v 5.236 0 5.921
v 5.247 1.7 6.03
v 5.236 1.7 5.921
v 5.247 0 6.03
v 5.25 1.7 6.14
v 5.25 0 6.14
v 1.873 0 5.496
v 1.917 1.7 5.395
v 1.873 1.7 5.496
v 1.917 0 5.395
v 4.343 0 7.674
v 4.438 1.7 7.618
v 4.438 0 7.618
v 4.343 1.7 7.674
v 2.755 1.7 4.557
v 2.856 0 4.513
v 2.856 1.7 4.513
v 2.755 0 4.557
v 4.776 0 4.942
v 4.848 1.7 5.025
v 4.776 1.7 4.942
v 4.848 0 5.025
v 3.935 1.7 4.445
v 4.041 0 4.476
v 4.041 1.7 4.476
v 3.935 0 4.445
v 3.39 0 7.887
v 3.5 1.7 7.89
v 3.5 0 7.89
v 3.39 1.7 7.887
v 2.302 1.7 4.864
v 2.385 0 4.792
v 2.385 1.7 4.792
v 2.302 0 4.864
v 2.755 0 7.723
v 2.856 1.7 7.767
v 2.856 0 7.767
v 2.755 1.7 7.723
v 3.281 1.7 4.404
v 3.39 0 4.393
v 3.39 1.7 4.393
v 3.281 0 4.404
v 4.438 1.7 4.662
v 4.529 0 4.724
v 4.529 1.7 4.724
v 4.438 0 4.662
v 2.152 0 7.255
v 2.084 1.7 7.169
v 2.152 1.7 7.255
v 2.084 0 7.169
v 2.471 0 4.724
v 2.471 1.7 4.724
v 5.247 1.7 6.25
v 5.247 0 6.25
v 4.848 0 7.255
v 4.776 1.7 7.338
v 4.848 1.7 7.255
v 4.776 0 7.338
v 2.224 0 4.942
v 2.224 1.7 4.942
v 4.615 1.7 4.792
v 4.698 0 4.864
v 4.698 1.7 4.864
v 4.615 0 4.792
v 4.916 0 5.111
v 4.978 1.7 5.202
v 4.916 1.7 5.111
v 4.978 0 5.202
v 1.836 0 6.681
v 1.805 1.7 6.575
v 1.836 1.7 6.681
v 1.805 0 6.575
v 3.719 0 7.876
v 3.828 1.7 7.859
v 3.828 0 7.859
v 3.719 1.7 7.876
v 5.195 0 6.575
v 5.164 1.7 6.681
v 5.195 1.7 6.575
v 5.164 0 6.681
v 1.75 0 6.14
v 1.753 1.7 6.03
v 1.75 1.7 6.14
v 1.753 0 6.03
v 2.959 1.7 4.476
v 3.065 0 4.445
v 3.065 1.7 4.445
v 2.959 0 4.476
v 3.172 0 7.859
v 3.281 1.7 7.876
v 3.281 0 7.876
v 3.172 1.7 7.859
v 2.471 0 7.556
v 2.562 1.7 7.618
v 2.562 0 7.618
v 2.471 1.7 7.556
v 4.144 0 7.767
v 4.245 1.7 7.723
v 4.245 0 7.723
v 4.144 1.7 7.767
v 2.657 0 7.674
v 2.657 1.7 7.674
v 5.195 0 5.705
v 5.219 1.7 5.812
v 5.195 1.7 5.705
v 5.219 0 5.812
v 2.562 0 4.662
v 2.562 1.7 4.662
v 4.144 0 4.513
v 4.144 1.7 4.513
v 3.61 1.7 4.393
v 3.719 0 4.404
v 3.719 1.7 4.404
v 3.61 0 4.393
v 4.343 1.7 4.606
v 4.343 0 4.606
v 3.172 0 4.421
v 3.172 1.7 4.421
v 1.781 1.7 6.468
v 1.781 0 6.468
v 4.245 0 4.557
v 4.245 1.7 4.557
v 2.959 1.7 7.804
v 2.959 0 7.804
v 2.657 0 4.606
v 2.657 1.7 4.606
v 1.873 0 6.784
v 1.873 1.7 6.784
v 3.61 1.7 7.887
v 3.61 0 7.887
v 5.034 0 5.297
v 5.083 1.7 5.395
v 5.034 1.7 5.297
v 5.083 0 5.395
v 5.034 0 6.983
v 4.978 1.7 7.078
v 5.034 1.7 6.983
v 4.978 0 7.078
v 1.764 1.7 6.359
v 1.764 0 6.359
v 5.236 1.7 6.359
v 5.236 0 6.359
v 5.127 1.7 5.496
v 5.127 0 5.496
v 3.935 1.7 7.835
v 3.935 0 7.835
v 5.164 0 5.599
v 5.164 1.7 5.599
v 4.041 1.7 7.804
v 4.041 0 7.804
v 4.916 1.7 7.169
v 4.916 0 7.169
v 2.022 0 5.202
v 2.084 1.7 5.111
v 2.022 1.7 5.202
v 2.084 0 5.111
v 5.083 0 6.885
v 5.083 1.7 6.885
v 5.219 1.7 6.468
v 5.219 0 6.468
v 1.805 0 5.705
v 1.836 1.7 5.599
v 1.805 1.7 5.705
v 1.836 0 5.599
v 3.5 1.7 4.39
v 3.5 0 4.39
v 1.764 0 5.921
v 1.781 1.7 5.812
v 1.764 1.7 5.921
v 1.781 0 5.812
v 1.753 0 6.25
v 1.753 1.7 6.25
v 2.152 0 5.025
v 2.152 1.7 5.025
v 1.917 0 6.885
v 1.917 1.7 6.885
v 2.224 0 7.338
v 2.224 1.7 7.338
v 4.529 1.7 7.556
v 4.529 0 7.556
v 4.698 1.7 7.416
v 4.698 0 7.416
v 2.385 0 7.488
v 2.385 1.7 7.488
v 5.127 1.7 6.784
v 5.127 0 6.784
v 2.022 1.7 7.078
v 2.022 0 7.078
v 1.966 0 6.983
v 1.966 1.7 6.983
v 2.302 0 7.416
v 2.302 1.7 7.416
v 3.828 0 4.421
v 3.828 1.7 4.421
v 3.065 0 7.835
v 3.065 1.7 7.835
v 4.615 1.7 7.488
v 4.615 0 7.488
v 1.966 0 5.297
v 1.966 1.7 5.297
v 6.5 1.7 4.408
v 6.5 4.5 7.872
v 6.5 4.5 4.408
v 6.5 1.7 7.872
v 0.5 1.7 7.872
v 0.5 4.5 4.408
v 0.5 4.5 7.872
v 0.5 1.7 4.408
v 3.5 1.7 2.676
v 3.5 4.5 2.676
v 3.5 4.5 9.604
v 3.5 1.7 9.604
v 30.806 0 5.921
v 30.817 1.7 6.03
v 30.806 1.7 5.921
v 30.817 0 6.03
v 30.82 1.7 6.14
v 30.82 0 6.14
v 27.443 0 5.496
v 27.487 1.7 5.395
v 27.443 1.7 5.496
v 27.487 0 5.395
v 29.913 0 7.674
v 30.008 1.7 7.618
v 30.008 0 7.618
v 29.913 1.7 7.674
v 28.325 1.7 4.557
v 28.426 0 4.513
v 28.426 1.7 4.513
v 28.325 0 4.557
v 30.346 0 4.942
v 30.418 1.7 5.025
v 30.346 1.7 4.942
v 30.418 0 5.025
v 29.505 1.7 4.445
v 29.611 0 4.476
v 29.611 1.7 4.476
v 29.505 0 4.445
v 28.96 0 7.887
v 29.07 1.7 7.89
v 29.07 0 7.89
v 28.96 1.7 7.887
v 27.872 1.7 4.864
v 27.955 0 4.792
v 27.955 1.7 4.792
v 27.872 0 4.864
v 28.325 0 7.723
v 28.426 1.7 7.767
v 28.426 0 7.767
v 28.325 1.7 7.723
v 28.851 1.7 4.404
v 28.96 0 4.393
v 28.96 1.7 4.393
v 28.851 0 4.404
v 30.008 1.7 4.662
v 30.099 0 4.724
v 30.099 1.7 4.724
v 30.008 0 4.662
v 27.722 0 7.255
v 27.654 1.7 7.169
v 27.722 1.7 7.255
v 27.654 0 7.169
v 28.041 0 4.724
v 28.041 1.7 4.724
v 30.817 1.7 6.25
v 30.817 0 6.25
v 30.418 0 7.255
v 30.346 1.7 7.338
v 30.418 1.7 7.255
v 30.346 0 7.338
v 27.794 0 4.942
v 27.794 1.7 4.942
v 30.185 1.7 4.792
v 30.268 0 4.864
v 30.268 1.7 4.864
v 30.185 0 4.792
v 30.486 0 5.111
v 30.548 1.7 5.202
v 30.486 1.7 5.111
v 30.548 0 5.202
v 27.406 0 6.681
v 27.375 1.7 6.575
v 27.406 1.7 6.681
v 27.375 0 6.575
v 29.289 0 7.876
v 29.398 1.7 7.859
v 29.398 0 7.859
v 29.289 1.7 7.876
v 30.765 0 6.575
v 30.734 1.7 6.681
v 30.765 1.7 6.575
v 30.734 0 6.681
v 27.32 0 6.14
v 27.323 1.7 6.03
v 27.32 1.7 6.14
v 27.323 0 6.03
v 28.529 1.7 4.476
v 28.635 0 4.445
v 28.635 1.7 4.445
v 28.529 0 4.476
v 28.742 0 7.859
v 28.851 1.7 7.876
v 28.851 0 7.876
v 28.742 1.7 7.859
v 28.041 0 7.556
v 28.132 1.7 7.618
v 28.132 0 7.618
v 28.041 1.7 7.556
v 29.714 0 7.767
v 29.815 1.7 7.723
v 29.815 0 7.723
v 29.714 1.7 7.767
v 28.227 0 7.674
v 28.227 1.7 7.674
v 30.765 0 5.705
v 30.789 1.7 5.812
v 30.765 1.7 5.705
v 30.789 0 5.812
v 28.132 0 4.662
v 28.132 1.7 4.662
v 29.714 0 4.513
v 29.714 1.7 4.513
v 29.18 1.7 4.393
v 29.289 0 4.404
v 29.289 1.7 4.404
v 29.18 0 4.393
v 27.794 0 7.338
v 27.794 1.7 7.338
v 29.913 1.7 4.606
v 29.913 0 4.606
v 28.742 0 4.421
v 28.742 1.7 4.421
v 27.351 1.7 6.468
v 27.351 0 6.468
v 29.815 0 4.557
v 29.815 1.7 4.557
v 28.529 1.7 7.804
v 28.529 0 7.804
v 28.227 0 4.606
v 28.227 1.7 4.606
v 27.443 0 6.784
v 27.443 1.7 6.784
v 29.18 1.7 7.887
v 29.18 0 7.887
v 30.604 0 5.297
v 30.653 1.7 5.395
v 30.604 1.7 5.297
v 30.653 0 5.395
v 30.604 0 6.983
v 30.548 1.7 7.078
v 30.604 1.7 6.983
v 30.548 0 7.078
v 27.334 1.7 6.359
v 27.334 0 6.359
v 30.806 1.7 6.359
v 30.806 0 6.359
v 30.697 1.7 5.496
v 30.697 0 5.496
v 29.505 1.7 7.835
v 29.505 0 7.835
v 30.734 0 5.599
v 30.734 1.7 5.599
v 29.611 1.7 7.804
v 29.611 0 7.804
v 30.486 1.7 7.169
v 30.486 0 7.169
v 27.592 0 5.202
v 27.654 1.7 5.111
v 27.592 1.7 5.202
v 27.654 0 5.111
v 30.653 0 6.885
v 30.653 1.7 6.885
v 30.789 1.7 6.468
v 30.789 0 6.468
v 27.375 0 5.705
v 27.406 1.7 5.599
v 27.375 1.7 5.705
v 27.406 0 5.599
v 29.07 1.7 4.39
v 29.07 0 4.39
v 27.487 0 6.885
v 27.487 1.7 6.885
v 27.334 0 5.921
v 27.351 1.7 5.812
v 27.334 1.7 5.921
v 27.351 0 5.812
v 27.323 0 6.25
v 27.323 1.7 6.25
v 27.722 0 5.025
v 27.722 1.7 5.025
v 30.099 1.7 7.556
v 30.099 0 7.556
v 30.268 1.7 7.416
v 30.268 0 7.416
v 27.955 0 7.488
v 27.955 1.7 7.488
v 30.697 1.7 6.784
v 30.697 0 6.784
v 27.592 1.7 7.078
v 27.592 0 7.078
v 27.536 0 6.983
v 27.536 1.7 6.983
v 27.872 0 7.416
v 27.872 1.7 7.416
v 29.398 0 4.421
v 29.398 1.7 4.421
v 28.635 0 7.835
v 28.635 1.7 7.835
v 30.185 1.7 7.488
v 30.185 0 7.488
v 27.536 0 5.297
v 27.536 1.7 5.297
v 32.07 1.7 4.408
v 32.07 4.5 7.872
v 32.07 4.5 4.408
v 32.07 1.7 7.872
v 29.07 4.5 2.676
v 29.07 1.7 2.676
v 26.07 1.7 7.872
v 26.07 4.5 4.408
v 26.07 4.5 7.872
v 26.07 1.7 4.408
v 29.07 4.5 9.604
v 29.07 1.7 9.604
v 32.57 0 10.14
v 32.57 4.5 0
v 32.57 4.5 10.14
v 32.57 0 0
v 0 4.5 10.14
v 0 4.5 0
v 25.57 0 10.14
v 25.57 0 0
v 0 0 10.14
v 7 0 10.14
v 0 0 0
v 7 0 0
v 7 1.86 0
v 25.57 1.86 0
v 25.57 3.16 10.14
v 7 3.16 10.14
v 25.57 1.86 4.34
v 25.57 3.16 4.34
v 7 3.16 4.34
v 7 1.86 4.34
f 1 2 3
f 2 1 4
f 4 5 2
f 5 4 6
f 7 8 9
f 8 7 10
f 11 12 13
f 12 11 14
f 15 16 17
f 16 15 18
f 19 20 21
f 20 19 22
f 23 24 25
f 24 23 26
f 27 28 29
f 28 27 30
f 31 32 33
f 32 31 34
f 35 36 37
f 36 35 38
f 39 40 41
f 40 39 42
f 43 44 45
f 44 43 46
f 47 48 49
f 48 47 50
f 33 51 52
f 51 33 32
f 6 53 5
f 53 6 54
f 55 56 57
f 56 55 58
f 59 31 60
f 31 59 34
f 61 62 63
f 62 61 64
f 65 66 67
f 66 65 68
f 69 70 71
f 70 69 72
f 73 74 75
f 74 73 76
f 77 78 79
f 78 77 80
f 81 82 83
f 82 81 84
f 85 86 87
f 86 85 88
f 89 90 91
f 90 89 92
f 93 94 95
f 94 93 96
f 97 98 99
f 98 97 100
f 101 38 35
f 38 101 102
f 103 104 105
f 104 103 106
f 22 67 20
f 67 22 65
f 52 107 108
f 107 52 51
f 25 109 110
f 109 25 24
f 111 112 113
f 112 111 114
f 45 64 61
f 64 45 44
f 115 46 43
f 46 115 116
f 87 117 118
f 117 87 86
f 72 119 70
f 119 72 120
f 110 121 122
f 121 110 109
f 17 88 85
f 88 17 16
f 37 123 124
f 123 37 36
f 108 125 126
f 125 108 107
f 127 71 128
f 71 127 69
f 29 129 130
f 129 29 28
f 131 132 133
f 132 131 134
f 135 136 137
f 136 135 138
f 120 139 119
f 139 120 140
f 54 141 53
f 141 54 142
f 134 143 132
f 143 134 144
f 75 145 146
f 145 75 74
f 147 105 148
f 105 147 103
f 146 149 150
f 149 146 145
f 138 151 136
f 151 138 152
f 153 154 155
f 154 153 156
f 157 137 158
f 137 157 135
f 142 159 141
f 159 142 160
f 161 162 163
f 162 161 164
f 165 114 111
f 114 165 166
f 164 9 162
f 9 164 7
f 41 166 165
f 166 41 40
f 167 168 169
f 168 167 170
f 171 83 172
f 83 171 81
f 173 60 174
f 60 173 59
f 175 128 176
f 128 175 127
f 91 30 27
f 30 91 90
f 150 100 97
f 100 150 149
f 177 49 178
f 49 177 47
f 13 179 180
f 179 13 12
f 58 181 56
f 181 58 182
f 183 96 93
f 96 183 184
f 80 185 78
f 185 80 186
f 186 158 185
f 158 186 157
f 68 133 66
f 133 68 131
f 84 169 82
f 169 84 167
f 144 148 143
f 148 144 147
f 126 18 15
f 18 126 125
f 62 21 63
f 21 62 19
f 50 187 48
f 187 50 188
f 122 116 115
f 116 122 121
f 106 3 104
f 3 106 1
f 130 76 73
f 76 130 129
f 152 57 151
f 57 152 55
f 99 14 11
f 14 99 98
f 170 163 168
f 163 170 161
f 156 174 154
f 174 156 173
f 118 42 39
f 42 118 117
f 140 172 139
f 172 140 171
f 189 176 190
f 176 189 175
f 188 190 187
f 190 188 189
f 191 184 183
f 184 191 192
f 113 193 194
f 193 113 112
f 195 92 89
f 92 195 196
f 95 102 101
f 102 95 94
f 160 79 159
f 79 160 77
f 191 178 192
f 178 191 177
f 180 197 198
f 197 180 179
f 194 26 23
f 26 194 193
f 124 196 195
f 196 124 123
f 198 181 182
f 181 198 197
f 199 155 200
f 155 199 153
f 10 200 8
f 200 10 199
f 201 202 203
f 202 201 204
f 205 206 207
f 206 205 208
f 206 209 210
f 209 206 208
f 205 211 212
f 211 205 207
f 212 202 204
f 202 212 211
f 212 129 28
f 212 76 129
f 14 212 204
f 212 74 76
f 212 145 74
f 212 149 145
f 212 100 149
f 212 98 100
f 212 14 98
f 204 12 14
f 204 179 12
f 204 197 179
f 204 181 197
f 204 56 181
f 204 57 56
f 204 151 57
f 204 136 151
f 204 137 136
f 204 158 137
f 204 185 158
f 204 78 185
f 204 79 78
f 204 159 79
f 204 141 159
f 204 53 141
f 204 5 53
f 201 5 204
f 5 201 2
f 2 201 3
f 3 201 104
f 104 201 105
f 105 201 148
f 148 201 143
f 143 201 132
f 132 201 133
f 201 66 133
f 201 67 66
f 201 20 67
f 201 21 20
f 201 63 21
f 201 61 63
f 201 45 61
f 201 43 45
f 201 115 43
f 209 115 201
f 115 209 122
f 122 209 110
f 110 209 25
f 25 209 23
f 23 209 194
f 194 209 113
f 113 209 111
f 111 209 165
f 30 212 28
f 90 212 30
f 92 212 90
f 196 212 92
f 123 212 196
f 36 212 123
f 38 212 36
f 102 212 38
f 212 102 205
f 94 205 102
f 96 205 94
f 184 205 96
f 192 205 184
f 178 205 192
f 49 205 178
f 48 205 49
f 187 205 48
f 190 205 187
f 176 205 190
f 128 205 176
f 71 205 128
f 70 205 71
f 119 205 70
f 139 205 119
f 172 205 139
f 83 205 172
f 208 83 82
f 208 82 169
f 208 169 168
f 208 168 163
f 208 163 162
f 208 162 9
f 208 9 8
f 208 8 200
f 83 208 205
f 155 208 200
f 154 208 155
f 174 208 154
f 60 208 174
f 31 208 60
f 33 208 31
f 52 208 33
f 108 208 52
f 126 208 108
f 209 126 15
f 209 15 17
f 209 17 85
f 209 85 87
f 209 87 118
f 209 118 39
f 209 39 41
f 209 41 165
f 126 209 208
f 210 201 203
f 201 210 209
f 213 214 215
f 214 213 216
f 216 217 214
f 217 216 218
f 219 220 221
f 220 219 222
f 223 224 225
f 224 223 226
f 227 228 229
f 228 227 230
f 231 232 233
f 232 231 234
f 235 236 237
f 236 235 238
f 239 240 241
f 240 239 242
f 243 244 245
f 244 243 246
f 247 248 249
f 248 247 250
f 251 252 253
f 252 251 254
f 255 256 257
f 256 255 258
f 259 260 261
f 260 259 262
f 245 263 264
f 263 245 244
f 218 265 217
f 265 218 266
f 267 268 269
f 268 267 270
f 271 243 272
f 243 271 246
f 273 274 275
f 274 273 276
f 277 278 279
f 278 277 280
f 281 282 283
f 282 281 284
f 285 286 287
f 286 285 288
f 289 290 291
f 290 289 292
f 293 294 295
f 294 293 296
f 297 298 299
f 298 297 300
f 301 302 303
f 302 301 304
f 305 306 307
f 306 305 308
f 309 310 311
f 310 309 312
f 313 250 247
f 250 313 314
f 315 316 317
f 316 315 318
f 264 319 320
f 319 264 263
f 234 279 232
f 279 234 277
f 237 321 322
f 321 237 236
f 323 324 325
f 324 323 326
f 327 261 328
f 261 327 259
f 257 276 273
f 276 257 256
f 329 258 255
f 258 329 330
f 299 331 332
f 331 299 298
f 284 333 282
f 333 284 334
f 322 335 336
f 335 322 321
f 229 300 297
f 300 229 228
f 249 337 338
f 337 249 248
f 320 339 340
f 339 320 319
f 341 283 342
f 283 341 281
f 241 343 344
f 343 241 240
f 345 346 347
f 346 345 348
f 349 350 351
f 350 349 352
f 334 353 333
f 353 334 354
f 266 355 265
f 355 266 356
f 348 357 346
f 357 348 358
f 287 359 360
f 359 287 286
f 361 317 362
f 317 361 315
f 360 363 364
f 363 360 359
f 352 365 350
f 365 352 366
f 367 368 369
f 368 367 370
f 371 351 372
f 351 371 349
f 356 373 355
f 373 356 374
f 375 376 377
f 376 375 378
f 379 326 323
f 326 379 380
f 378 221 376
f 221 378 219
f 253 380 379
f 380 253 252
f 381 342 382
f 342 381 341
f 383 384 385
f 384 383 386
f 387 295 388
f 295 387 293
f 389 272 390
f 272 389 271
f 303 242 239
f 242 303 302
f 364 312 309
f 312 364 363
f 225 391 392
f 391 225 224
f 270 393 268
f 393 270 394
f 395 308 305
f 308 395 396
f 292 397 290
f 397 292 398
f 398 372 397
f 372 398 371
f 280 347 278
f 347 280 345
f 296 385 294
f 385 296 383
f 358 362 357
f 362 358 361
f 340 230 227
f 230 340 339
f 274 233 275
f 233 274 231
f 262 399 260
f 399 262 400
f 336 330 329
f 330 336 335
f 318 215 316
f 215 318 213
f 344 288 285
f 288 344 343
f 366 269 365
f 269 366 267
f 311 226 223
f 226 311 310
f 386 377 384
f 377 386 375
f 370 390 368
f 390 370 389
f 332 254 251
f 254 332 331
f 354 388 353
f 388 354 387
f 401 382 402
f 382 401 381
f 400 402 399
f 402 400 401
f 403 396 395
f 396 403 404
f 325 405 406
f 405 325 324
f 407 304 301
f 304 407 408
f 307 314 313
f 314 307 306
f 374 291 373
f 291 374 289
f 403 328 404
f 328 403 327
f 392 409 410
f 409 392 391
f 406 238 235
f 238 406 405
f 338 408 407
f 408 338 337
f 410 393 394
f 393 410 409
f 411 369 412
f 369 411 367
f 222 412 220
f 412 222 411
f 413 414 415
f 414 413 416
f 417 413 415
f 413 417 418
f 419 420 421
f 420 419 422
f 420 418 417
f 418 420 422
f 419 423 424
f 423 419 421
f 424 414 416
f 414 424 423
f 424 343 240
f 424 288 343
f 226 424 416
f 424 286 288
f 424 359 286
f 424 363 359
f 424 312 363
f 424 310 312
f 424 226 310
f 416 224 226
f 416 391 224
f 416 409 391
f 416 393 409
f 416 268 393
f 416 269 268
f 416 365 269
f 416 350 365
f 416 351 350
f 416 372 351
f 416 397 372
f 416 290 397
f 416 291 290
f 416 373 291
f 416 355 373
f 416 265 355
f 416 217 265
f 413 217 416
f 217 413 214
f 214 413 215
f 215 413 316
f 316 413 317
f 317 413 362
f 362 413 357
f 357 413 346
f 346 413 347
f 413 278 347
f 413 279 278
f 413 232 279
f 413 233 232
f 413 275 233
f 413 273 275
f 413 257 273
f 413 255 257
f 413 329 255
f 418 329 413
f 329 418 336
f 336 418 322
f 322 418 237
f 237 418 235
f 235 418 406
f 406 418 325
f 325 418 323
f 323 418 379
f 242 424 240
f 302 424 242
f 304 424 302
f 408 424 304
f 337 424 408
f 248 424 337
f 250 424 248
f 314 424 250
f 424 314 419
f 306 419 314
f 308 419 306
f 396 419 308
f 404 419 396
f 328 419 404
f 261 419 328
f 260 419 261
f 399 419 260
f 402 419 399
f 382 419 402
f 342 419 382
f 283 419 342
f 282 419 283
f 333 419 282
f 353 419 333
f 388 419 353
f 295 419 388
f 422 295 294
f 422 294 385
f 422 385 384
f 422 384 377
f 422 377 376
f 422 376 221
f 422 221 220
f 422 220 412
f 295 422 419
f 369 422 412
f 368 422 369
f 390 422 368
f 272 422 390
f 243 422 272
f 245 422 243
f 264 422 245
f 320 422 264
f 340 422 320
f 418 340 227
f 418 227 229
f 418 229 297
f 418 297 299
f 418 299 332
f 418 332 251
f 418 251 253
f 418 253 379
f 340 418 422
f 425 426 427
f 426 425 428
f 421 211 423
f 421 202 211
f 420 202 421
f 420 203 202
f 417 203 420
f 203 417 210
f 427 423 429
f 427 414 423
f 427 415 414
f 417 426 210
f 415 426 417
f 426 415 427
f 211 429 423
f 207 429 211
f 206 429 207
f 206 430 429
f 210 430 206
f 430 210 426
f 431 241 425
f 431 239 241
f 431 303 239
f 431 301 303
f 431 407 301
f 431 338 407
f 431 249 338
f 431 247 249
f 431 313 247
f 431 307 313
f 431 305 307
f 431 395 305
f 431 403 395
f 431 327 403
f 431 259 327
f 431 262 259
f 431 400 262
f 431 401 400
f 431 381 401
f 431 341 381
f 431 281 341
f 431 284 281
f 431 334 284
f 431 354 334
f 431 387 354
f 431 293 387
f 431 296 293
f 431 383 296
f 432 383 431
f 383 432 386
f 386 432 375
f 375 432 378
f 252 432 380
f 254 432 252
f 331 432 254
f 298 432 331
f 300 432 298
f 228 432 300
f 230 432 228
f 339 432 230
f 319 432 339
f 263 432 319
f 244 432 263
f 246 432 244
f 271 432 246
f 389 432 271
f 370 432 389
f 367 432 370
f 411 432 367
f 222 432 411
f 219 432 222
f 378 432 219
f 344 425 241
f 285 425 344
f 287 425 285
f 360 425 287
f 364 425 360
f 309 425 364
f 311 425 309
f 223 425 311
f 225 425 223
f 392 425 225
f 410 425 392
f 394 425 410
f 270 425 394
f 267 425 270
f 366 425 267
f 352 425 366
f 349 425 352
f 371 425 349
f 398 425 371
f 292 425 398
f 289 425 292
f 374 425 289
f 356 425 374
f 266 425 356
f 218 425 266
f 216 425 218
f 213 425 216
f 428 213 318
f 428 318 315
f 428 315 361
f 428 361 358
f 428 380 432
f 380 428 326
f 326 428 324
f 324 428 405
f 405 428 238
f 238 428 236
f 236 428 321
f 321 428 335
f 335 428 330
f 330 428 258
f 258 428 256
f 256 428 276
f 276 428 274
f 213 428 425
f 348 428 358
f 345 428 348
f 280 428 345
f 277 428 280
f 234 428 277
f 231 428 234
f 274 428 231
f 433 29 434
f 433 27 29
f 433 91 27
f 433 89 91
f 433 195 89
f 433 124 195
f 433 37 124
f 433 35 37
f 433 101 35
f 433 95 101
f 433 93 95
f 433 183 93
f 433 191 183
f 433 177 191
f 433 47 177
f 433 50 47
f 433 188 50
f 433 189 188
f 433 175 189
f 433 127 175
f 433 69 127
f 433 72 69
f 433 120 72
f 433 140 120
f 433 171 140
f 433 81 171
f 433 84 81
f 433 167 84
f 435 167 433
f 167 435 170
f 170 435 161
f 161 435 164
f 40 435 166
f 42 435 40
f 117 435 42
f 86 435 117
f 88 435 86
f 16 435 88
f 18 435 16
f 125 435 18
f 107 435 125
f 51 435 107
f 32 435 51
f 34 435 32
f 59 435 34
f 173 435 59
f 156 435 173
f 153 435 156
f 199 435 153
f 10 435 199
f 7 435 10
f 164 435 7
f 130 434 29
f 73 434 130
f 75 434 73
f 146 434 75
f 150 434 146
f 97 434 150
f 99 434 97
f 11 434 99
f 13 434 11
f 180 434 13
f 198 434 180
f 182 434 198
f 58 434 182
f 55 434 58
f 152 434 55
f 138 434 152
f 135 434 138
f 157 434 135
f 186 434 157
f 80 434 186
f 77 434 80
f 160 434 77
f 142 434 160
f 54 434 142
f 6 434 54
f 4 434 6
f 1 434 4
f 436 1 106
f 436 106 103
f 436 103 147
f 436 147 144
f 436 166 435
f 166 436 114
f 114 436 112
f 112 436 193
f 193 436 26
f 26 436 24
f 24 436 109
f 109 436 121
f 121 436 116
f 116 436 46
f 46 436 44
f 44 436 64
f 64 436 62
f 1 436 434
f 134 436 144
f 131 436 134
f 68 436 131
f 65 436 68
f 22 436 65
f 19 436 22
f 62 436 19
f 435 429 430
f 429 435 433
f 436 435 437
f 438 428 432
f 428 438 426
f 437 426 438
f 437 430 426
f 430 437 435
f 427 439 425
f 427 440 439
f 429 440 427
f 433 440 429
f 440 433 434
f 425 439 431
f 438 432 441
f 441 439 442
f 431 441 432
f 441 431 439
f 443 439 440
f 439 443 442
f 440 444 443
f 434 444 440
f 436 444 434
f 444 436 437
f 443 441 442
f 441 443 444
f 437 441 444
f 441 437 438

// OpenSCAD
// file: ../assets/usb-charger/configurations.scad
usb_charger_asset_electronic_card_x_size = 17.57;
usb_charger_asset_electronic_card_y_size = 27.85;
usb_charger_asset_electronic_card_z_size = 0.87;
usb_charger_asset_usb_port_x_size = 9;
usb_charger_asset_usb_port_y_size = 7.39;
usb_charger_asset_usb_port_z_size = 3.29;
usb_charger_asset_usb_round_radius = 1.5;
usb_charger_asset_draw_rounded_usb = true;
usb_charger_asset_usb_port_x_offset = 4.5;
usb_charger_asset_usb_port_y_offset = -1.36;
usb_charger_asset_fn = 20;
// file: ../configurations/global.scad
housing_facades_throws_diameter = 3.8;

// external size
case_external_x_size = 90;
case_external_y_size = 140;
case_external_z_size = 38;
case_external_panes_thickness = 4.8;

facade_front_round_edges_radius = 5;
facade_throws_margin = 5;

facade_front_fixation_throws_diameter = housing_facades_throws_diameter;

// facade corners
facade_corners_offset_lenght = 9;
facade_corners_main_x_size = 19;
facade_corners_main_y_size = 19;
facade_corners_main_thickness = 11;
facade_corners_correction_offset_length = 0.2;
facade_corners_correction_offset_thickness = 0.0;
facade_fn = 100;


facade_controller_coords = [
    case_external_x_size / 2,
    case_external_y_size / 2 - 30,
];


// Screen frames
screen_frame_electronic_board_margin = 3;
screen_frame_throw_diameter = 3.5;
screen_frame_piece_z_size = 1.5;
screen_frame_piece_glass_embedding_margin = 1;
screen_frame_piece_glass_embedding_z_depth = 1;
screen_frame_facade_piece_z_size = 1;
screen_frame_fn = 100;

screen_glass_visible_zone_x_margin = 0.7;
screen_glass_visible_zone_y_margin = 0.7;
screen_glass_z_size = 1;

facade_screen_coords = [
    case_external_x_size / 2,
    case_external_y_size / 2 + 28,
];


// Generics
insert_throw_diameter = 4.2;
insert_throw_length = 6 + 2;


// Controller facade
controller_breadboard_x_size_point = 28;
controller_breadboard_y_size_point = 9;

controller_facade_z_size = 2;
controller_facade_button_throw_margin = 1;
controller_facade_small_button_throw_margin = 0.5;
controller_facade_a_b_button_throw_margin = 0.5;

controller_facade_border_rounded_border_1 = 5;
controller_facade_border_rounded_border_2 = 4;

controller_facade_with_border_x_size = 82;
controller_facade_with_border_y_size = 47;

controller_facade_border_throws_margin = 5;
controller_braidboard_throw_margin = 1;

controller_facade_border_fn = 80;


// Cross Button
controller_cross_button_x_y_size = 20;
controller_cross_button_z_size = 4;
controller_cross_button_thickness = 6;
controller_cross_button_round_edges_radius = 1;
controller_cross_button_support_x_y_size = 22;
controller_cross_button_support_z_size = 1;
controller_cross_button_fn = 150;


// A and B Buttons
controller_a_b_button_diameter = 7.5;
controller_a_b_button_z_size = 4;
controller_a_b_button_support_diameter = 9.5;
controller_a_b_button_support_z_size = 1;
controller_a_b_button_fn = 80;


// small Buttons
controller_small_button_diameter = 5.5;
controller_small_button_z_size = 3;
controller_small_button_support_diameter = 7.5;
controller_small_button_support_z_size = 1;
controller_small_button_fn = 80;

// Directional cross
controller_directional_cross_points_coords = [6, 5];
controller_start_button_points_coords = [14, 3];
controller_select_button_points_coords = [18, 3];
controller_menu_button_points_coords = [14, 7];
controller_option_button_points_coords = [18, 7];
controller_a_button_points_coords = [23, 4];
controller_b_button_points_coords = [27, 6];
controller_bolt_throws_list = [
    [2, 2],
    [2, 8],
    [10, 2],
    [10, 8],
    [27, 2],
    [23, 8],
];


// usb charger holder
usb_charger_support_total_x_size = 17.57 + 15;
usb_charger_support_total_y_size = 12;
usb_charger_support_total_z_size = 2;


usb_charger_fixation_support_z_size = 4.5;
usb_charger_encaps_x_size = 17.57 + 1;
usb_charger_encaps_y_size = 27.85 + 1;
usb_charger_encaps_z_size = 1;

usb_charger_facade_x_fixation_spacing = 42;
usb_charger_facade_y_size = 1.36;
usb_charger_facade_z_size = 14;

usb_charger_throw_diameter = 3.5;
usb_charger_facade_holder_z_offset = 3.5; //
usb_charger_fixation_facade_y_margin = 0.5;
usb_charger_throw_offset_y = 4.5;
usb_charger_throw_offset_x = 3.5;
usb_charger_facade_fn = 100;

usb_charger_external_facade_main_throw_margin = 2;
usb_charger_external_facade_main_throw_diameter = housing_facades_throws_diameter;

usb_charger_coords = [
    28, 15
];


facade_top_on_off_button_throw_diameter = 12.8;

facade_top_on_off_button_coords = [
    case_external_x_size / 2 + 18,
    case_external_z_size / 2
];


// Bolt join Piece Mother board
bolt_join_mother_board_internal_diameter = 3.5;
bolt_join_mother_board_external_diameter = 3.5 + (0.4 * 6);
bolt_join_mother_board_height = 3;

// Bolt join Piece GamePadController
bolt_join_game_pad_internal_diameter = 3.5;
bolt_join_game_pad_external_diameter = 3.5 + (0.4 * 6);
bolt_join_game_pad_height = 6.5;

bolt_join_fn = 500;


// Mother board breadboard
mother_board_x_size_point = 25;
mother_board_y_size_point = 32;

mother_board_coords = [
    case_external_x_size / 2 - ((mother_board_x_size_point + 1) * 2.54) / 2,
    44,
    3
];

mother_board_bolt_throws_list = [
    [3, 2],
    [3, 17],
    [23, 2],
    [23, 17],
];


// Speaker
speaker_facade_throw_diameter = 28 + 1;
speaker_facade_z_size = 1.36;
speaker_facade_rounded_radius = 5;
// main file
include <../configurations/global.scad>
include <../assets/usb-charger/configurations.scad>

/**
 * usbChargerFacadeHolderPiece
 * @name usbChargerFacadeHolderPiece
 * @description Usb charger fixation to facade holder piece
 * @type component
 * @parent usbChargerComponent
 */
module usbChargerFixationPiece(
    support_total_x_size = usb_charger_support_total_x_size,
    support_total_y_size = usb_charger_support_total_y_size - abs(usb_charger_asset_usb_port_y_offset) - usb_charger_fixation_facade_y_margin,
    support_total_z_size = usb_charger_fixation_support_z_size,
    encaps_x_size = usb_charger_encaps_x_size,
    encaps_1_y_size = 5.8,
    encaps_1_z_size = usb_charger_asset_usb_port_z_size - (usb_charger_encaps_z_size - usb_charger_asset_electronic_card_z_size),
    encaps_2_y_size = 10,
    encaps_2_z_size = usb_charger_asset_usb_port_z_size - (usb_charger_encaps_z_size - usb_charger_asset_electronic_card_z_size) - 1.3,

    throw_offset_y = usb_charger_throw_offset_y - usb_charger_fixation_facade_y_margin,
    throw_offset_x = usb_charger_throw_offset_x,
    throw_diameter = usb_charger_throw_diameter,

    fadace_fn = usb_charger_facade_fn
) {
    difference() {
        translate([0, 0, 0])
            cube([
                support_total_x_size,
                support_total_y_size,
                support_total_z_size,
            ]);

        // Encaps on usb
        translate([
            (support_total_x_size - encaps_x_size) / 2, -0.01, -0.01])
            cube([
                encaps_x_size,
                encaps_1_y_size + 0.01,
                encaps_1_z_size + 0.01,
            ]);

        // encaps rest
        translate([
            (support_total_x_size - encaps_x_size) / 2,
            encaps_1_y_size - 0.01,
            -0.01
        ])
            cube([
                encaps_x_size,
                encaps_2_y_size + 0.01,
                encaps_2_z_size + 0.01,
            ]);

        nut_encaps_diameter = 6;
        nut_encaps_depth = 2.8;
        // Throws
        translate([
            throw_offset_x,
            throw_offset_y,
            0
        ]) {
            cylinder(h = support_total_z_size * 4, d = throw_diameter, center = true, $fn = fadace_fn);
            translate([0,0,support_total_z_size - nut_encaps_depth])
                rotate([0,0,90])
                cylinder(h = 5, r = nut_encaps_diameter / 2 / cos(30) , $fn = 6);
        }
         
        translate([
            support_total_x_size - throw_offset_x,
            throw_offset_y,
            0
        ]) {
            cylinder(h = support_total_z_size * 4, d = throw_diameter, center = true, $fn = fadace_fn);
            translate([0,0,support_total_z_size - nut_encaps_depth])
                rotate([0,0,90])
                cylinder(h = 5, r = nut_encaps_diameter / 2 / cos(30) , $fn = 6);
        }
    }
}


/**
 * @stl
 * @png
 * @colorscheme BeforeDawn
 * @view axes,scales
 */
translate(
    [
        0,
        0,
        usb_charger_support_total_y_size - abs(usb_charger_asset_usb_port_y_offset) - usb_charger_fixation_facade_y_margin
    ]
)
    rotate([-90, 0, 0])
        usbChargerFixationPiece();
